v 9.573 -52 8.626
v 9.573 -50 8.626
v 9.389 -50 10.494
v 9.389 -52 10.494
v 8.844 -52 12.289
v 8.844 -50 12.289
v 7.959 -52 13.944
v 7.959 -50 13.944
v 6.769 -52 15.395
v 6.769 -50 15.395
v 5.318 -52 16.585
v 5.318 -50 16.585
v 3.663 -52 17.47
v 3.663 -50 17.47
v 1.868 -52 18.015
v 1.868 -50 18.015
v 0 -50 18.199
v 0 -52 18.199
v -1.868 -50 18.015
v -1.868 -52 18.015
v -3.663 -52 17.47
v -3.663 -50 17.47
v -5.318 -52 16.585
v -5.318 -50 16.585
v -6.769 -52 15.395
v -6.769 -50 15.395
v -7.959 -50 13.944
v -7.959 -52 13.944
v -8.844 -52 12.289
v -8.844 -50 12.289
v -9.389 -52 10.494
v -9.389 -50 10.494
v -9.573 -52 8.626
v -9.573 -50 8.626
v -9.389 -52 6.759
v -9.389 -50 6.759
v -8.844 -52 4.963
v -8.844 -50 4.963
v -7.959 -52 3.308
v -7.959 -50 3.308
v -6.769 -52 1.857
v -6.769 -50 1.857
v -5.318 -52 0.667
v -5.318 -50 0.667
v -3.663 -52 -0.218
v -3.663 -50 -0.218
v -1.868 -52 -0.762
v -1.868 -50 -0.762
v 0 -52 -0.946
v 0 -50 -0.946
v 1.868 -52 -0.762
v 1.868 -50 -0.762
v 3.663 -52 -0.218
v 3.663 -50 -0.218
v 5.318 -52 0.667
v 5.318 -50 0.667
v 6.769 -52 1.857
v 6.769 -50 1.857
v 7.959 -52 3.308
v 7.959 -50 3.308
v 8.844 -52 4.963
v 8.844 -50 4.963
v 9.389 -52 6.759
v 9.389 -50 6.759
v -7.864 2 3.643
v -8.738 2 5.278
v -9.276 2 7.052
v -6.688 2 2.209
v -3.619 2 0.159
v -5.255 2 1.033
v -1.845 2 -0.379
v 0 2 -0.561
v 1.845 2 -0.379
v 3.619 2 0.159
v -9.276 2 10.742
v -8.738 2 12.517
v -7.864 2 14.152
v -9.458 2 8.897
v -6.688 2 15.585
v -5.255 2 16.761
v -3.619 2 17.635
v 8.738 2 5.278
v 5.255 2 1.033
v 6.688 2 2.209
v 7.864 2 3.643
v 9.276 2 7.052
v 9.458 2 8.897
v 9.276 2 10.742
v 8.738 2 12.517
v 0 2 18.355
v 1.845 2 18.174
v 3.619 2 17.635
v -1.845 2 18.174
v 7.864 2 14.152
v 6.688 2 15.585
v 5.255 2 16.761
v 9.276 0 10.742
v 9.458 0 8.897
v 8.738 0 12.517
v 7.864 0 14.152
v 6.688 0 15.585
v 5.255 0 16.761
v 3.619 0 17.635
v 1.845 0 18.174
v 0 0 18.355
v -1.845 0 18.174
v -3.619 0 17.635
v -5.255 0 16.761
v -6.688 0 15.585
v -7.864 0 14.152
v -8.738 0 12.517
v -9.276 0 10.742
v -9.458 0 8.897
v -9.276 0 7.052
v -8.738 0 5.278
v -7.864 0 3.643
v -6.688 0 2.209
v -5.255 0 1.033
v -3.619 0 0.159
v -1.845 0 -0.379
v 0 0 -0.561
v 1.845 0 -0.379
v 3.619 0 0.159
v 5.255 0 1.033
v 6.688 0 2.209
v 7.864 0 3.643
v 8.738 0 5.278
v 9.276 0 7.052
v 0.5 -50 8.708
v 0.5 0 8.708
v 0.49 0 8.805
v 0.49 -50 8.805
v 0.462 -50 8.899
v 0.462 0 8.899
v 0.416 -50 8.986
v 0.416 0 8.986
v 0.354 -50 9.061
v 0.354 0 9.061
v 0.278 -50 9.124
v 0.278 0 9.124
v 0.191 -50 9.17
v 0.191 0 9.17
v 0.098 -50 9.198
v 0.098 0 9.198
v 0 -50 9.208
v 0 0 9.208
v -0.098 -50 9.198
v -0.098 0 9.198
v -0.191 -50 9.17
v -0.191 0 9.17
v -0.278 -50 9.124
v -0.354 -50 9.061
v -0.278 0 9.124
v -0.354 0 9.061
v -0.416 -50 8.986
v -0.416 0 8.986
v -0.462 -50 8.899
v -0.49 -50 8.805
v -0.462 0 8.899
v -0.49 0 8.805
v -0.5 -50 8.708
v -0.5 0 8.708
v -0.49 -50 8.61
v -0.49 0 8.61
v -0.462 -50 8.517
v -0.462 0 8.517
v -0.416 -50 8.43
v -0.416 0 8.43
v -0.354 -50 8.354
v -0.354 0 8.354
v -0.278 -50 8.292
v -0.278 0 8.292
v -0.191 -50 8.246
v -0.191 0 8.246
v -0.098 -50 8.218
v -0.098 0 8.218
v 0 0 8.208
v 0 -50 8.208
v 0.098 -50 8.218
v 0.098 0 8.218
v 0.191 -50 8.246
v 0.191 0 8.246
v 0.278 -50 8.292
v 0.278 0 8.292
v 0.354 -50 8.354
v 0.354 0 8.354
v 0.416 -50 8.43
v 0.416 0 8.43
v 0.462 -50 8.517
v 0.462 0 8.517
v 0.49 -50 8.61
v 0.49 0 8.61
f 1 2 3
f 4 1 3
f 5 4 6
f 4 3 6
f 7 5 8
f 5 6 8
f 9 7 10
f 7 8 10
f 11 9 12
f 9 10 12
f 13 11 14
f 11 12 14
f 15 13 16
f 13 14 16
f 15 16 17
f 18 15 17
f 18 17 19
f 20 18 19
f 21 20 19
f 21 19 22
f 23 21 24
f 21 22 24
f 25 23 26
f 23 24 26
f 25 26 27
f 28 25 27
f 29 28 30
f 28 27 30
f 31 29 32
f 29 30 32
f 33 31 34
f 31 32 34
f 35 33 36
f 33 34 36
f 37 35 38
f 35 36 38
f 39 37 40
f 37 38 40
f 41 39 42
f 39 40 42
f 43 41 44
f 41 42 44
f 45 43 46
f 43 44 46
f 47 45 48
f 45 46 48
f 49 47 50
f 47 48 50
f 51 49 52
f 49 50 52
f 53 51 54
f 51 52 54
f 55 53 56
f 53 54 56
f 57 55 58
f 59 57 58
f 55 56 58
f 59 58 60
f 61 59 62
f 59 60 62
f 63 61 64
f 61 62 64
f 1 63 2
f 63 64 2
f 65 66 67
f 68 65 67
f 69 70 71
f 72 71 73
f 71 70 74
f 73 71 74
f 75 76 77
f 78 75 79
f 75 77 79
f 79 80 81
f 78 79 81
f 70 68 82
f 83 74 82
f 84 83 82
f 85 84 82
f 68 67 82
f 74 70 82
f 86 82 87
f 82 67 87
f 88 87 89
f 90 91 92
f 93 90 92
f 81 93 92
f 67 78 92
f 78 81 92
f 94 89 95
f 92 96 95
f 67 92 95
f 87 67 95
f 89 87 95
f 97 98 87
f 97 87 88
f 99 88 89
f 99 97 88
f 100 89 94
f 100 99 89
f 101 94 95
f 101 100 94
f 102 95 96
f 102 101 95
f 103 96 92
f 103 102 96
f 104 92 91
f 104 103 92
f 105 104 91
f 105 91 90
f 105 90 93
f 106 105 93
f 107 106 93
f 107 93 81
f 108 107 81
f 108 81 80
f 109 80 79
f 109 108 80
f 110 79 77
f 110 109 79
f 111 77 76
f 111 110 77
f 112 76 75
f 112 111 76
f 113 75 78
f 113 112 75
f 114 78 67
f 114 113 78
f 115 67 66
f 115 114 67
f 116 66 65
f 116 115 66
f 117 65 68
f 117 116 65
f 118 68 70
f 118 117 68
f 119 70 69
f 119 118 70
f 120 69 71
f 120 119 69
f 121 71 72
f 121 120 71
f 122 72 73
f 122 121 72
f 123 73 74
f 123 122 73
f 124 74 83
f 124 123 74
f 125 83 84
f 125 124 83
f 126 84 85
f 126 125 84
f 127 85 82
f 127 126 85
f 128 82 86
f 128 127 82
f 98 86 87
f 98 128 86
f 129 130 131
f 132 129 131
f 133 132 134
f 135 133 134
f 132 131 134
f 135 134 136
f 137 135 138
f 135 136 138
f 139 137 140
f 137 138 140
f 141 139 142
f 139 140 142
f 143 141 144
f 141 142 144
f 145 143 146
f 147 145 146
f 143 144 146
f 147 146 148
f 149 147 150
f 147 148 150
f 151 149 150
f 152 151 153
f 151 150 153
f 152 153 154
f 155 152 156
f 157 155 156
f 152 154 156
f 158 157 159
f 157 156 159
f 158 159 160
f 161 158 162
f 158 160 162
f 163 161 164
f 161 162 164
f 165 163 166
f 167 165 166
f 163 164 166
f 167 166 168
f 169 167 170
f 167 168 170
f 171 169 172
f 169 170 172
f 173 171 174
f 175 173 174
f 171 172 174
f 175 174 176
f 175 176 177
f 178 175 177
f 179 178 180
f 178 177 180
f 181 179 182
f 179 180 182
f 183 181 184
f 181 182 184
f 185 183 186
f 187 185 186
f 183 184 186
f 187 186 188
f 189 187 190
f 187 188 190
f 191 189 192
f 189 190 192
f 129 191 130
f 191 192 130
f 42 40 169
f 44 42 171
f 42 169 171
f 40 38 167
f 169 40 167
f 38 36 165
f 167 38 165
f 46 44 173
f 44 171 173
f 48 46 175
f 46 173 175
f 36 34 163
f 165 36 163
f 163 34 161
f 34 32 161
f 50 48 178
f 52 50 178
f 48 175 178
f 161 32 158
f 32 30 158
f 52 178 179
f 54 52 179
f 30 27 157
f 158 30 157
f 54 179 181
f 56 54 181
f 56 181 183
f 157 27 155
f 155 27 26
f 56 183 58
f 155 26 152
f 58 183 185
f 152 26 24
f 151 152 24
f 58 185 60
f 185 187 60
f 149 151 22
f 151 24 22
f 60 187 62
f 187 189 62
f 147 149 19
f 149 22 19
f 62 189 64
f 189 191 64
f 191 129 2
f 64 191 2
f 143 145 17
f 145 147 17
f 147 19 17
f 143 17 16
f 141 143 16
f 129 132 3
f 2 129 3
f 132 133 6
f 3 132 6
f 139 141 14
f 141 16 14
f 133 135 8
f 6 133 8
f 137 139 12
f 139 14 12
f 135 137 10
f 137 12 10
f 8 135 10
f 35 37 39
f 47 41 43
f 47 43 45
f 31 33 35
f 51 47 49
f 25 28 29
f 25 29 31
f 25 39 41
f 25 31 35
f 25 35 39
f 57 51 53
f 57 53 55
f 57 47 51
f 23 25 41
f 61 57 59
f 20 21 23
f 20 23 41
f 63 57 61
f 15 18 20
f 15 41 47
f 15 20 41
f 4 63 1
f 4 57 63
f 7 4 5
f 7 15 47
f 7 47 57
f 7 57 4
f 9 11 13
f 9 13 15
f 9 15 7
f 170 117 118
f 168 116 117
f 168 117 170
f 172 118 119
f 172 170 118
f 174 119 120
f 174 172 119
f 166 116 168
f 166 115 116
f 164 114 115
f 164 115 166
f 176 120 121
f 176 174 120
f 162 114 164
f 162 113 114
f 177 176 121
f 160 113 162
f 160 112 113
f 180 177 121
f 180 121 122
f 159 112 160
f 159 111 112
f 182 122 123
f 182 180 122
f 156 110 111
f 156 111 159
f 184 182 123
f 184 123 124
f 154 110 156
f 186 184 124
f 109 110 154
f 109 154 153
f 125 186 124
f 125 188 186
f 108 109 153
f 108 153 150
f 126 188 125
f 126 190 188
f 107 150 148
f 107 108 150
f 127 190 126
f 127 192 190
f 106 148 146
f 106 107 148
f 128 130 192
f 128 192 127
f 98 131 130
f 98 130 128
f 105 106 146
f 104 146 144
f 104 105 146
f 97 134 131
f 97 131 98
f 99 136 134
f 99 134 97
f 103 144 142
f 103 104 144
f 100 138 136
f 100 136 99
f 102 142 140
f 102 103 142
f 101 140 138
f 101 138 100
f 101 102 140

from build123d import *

# Parameters (mm, degrees)
F0_R     = 0.5
F1_DEPTH = 50
F3_R     = 9.458043
F4_DEPTH = 2
F6_R     = 9.572507
F7_DEPTH = 2


with BuildPart() as f1:
    # F0 (on Front) → F1 (new body)
    with BuildSketch(Plane.XZ):
        with Locations((0, 8.707933)):
            Circle(F0_R)
    extrude(amount=F1_DEPTH)

    # F3 (on Front) → F4 (join)
    with BuildSketch(Plane.XZ):
        with Locations((0, 8.897236)):
            Circle(F3_R)
    extrude(amount=-F4_DEPTH)

    # F6 (on offset) → F7 (join)
    with BuildSketch(Plane.XZ.offset(50)):
        with Locations((0, 8.626235)):
            Circle(F6_R)
    extrude(amount=F7_DEPTH)


solid = f1.part
